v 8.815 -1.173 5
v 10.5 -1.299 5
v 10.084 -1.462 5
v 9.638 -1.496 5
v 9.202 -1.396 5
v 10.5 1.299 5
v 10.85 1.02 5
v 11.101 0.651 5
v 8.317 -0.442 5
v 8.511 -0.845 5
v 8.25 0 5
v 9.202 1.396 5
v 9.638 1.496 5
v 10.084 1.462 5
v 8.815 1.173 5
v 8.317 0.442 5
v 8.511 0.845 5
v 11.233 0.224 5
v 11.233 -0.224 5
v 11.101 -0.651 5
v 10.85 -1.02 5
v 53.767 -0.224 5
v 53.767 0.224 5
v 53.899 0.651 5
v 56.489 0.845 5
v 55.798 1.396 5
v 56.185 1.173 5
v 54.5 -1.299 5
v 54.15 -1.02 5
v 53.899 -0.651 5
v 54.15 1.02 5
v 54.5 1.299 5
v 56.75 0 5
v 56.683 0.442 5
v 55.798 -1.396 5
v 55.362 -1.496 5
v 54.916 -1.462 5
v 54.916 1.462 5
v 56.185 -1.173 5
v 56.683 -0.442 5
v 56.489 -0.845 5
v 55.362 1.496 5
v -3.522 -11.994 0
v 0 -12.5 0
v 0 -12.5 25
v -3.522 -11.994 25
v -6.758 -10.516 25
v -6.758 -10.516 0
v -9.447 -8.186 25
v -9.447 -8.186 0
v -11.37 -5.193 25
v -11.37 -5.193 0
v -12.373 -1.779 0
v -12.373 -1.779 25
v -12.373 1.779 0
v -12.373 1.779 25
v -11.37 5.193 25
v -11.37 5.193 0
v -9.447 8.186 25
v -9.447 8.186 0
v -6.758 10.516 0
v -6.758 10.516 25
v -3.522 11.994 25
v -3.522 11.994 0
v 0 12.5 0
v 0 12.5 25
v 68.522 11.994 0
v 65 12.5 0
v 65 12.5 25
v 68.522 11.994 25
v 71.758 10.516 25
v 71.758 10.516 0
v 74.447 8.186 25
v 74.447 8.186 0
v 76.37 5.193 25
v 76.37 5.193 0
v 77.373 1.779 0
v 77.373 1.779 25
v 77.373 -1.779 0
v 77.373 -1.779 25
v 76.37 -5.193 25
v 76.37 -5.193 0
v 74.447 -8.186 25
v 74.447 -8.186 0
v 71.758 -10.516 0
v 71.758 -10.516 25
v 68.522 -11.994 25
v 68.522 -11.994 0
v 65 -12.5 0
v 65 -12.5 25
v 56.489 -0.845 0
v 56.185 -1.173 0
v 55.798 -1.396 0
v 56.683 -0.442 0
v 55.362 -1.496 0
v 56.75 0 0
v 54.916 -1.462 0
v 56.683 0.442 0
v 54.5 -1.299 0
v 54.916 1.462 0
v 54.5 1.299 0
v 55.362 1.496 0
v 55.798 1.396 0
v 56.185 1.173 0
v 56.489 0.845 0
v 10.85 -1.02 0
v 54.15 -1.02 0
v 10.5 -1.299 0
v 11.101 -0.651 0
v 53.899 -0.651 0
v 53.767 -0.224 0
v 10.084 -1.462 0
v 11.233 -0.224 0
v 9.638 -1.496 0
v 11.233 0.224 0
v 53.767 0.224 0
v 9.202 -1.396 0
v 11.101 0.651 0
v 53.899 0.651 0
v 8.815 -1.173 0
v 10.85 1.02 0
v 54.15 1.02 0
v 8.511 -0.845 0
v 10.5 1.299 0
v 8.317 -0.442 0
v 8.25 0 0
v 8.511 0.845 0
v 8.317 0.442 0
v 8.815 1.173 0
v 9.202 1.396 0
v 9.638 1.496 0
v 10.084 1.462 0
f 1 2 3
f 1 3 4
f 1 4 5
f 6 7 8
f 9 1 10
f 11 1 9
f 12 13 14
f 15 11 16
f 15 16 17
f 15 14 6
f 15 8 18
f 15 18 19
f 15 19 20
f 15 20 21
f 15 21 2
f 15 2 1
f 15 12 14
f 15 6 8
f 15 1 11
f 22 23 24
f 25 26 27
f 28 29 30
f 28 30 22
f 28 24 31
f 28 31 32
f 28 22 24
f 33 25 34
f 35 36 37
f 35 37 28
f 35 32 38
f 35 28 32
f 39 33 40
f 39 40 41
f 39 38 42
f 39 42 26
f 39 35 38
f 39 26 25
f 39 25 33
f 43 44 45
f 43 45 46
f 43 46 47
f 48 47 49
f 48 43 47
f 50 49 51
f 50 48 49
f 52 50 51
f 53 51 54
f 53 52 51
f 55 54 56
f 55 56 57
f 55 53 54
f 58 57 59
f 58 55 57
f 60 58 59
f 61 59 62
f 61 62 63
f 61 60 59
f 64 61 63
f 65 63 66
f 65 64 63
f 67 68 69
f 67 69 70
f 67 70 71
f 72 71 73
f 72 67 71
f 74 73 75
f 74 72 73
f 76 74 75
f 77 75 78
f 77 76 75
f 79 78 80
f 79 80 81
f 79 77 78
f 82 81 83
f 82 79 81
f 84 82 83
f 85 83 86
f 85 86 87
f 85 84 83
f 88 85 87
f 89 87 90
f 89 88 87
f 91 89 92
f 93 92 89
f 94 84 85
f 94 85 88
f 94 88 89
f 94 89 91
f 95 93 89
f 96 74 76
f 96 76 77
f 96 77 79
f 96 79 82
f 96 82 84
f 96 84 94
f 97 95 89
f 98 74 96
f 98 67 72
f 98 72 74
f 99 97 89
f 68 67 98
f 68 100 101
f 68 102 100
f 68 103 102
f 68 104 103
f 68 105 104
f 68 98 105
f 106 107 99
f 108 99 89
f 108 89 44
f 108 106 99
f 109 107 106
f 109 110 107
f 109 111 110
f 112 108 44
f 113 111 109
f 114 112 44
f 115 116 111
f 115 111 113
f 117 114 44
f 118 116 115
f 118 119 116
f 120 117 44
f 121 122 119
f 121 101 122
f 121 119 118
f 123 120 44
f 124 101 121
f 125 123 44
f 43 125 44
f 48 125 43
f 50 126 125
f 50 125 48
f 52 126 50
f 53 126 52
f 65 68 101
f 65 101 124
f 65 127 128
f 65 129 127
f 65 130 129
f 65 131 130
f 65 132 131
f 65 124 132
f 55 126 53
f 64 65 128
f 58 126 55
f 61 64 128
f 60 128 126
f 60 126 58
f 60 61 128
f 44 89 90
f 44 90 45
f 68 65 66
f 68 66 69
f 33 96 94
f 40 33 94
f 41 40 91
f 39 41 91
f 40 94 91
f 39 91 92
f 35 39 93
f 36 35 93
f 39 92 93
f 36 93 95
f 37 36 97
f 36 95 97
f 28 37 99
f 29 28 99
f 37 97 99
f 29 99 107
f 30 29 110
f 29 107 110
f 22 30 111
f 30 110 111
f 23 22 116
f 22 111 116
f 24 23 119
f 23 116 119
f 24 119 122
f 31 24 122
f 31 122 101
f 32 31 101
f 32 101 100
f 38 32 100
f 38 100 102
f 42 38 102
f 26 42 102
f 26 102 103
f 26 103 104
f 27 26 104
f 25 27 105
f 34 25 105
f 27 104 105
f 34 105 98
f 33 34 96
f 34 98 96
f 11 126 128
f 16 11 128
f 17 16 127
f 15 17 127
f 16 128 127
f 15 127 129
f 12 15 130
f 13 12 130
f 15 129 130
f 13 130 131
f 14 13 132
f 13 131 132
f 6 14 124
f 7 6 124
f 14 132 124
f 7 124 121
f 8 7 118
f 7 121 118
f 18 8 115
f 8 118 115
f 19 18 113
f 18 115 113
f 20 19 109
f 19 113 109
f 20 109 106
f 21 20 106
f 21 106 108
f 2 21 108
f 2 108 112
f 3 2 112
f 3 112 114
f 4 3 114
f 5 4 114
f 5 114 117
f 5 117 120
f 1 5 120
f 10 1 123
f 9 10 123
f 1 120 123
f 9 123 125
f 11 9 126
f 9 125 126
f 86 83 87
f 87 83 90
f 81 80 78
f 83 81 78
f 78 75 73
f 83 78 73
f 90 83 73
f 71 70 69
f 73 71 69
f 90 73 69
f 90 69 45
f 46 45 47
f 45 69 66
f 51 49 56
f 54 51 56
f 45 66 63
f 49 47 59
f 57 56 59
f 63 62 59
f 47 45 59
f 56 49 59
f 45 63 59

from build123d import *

# Parameters (mm, degrees)
EXTRUDE_1_DEPTH     = 25
SKETCH_2_R          = 1.5
CUT_EXTRUDE_1_DEPTH = 5


with BuildPart() as part:
    # 草图1 → 凸台-拉伸1 (new body)
    with BuildSketch(Plane.XY):
        with BuildLine():
            Line((0, 12.5), (65, 12.5))
            ThreePointArc((65, 12.5), (77.5, 0), (65, -12.5))
            Line((65, -12.5), (0, -12.5))
            ThreePointArc((0, -12.5), (-12.5, 0), (0, 12.5))
        make_face()
    extrude(amount=EXTRUDE_1_DEPTH)

    # 草图2 → 切除-拉伸1 (cut)
    with BuildSketch(Plane(origin=(0, 0, 0), x_dir=(-1, 0, 0), z_dir=(0, 0, -1))):
        with Locations((-9.75, 0)):
            Circle(SKETCH_2_R)
        with Locations(Location((-55.25, 0, 0), (0, 0, 180))):
            Circle(SKETCH_2_R)
    extrude(amount=-CUT_EXTRUDE_1_DEPTH, mode=Mode.SUBTRACT)


solid = part.part
